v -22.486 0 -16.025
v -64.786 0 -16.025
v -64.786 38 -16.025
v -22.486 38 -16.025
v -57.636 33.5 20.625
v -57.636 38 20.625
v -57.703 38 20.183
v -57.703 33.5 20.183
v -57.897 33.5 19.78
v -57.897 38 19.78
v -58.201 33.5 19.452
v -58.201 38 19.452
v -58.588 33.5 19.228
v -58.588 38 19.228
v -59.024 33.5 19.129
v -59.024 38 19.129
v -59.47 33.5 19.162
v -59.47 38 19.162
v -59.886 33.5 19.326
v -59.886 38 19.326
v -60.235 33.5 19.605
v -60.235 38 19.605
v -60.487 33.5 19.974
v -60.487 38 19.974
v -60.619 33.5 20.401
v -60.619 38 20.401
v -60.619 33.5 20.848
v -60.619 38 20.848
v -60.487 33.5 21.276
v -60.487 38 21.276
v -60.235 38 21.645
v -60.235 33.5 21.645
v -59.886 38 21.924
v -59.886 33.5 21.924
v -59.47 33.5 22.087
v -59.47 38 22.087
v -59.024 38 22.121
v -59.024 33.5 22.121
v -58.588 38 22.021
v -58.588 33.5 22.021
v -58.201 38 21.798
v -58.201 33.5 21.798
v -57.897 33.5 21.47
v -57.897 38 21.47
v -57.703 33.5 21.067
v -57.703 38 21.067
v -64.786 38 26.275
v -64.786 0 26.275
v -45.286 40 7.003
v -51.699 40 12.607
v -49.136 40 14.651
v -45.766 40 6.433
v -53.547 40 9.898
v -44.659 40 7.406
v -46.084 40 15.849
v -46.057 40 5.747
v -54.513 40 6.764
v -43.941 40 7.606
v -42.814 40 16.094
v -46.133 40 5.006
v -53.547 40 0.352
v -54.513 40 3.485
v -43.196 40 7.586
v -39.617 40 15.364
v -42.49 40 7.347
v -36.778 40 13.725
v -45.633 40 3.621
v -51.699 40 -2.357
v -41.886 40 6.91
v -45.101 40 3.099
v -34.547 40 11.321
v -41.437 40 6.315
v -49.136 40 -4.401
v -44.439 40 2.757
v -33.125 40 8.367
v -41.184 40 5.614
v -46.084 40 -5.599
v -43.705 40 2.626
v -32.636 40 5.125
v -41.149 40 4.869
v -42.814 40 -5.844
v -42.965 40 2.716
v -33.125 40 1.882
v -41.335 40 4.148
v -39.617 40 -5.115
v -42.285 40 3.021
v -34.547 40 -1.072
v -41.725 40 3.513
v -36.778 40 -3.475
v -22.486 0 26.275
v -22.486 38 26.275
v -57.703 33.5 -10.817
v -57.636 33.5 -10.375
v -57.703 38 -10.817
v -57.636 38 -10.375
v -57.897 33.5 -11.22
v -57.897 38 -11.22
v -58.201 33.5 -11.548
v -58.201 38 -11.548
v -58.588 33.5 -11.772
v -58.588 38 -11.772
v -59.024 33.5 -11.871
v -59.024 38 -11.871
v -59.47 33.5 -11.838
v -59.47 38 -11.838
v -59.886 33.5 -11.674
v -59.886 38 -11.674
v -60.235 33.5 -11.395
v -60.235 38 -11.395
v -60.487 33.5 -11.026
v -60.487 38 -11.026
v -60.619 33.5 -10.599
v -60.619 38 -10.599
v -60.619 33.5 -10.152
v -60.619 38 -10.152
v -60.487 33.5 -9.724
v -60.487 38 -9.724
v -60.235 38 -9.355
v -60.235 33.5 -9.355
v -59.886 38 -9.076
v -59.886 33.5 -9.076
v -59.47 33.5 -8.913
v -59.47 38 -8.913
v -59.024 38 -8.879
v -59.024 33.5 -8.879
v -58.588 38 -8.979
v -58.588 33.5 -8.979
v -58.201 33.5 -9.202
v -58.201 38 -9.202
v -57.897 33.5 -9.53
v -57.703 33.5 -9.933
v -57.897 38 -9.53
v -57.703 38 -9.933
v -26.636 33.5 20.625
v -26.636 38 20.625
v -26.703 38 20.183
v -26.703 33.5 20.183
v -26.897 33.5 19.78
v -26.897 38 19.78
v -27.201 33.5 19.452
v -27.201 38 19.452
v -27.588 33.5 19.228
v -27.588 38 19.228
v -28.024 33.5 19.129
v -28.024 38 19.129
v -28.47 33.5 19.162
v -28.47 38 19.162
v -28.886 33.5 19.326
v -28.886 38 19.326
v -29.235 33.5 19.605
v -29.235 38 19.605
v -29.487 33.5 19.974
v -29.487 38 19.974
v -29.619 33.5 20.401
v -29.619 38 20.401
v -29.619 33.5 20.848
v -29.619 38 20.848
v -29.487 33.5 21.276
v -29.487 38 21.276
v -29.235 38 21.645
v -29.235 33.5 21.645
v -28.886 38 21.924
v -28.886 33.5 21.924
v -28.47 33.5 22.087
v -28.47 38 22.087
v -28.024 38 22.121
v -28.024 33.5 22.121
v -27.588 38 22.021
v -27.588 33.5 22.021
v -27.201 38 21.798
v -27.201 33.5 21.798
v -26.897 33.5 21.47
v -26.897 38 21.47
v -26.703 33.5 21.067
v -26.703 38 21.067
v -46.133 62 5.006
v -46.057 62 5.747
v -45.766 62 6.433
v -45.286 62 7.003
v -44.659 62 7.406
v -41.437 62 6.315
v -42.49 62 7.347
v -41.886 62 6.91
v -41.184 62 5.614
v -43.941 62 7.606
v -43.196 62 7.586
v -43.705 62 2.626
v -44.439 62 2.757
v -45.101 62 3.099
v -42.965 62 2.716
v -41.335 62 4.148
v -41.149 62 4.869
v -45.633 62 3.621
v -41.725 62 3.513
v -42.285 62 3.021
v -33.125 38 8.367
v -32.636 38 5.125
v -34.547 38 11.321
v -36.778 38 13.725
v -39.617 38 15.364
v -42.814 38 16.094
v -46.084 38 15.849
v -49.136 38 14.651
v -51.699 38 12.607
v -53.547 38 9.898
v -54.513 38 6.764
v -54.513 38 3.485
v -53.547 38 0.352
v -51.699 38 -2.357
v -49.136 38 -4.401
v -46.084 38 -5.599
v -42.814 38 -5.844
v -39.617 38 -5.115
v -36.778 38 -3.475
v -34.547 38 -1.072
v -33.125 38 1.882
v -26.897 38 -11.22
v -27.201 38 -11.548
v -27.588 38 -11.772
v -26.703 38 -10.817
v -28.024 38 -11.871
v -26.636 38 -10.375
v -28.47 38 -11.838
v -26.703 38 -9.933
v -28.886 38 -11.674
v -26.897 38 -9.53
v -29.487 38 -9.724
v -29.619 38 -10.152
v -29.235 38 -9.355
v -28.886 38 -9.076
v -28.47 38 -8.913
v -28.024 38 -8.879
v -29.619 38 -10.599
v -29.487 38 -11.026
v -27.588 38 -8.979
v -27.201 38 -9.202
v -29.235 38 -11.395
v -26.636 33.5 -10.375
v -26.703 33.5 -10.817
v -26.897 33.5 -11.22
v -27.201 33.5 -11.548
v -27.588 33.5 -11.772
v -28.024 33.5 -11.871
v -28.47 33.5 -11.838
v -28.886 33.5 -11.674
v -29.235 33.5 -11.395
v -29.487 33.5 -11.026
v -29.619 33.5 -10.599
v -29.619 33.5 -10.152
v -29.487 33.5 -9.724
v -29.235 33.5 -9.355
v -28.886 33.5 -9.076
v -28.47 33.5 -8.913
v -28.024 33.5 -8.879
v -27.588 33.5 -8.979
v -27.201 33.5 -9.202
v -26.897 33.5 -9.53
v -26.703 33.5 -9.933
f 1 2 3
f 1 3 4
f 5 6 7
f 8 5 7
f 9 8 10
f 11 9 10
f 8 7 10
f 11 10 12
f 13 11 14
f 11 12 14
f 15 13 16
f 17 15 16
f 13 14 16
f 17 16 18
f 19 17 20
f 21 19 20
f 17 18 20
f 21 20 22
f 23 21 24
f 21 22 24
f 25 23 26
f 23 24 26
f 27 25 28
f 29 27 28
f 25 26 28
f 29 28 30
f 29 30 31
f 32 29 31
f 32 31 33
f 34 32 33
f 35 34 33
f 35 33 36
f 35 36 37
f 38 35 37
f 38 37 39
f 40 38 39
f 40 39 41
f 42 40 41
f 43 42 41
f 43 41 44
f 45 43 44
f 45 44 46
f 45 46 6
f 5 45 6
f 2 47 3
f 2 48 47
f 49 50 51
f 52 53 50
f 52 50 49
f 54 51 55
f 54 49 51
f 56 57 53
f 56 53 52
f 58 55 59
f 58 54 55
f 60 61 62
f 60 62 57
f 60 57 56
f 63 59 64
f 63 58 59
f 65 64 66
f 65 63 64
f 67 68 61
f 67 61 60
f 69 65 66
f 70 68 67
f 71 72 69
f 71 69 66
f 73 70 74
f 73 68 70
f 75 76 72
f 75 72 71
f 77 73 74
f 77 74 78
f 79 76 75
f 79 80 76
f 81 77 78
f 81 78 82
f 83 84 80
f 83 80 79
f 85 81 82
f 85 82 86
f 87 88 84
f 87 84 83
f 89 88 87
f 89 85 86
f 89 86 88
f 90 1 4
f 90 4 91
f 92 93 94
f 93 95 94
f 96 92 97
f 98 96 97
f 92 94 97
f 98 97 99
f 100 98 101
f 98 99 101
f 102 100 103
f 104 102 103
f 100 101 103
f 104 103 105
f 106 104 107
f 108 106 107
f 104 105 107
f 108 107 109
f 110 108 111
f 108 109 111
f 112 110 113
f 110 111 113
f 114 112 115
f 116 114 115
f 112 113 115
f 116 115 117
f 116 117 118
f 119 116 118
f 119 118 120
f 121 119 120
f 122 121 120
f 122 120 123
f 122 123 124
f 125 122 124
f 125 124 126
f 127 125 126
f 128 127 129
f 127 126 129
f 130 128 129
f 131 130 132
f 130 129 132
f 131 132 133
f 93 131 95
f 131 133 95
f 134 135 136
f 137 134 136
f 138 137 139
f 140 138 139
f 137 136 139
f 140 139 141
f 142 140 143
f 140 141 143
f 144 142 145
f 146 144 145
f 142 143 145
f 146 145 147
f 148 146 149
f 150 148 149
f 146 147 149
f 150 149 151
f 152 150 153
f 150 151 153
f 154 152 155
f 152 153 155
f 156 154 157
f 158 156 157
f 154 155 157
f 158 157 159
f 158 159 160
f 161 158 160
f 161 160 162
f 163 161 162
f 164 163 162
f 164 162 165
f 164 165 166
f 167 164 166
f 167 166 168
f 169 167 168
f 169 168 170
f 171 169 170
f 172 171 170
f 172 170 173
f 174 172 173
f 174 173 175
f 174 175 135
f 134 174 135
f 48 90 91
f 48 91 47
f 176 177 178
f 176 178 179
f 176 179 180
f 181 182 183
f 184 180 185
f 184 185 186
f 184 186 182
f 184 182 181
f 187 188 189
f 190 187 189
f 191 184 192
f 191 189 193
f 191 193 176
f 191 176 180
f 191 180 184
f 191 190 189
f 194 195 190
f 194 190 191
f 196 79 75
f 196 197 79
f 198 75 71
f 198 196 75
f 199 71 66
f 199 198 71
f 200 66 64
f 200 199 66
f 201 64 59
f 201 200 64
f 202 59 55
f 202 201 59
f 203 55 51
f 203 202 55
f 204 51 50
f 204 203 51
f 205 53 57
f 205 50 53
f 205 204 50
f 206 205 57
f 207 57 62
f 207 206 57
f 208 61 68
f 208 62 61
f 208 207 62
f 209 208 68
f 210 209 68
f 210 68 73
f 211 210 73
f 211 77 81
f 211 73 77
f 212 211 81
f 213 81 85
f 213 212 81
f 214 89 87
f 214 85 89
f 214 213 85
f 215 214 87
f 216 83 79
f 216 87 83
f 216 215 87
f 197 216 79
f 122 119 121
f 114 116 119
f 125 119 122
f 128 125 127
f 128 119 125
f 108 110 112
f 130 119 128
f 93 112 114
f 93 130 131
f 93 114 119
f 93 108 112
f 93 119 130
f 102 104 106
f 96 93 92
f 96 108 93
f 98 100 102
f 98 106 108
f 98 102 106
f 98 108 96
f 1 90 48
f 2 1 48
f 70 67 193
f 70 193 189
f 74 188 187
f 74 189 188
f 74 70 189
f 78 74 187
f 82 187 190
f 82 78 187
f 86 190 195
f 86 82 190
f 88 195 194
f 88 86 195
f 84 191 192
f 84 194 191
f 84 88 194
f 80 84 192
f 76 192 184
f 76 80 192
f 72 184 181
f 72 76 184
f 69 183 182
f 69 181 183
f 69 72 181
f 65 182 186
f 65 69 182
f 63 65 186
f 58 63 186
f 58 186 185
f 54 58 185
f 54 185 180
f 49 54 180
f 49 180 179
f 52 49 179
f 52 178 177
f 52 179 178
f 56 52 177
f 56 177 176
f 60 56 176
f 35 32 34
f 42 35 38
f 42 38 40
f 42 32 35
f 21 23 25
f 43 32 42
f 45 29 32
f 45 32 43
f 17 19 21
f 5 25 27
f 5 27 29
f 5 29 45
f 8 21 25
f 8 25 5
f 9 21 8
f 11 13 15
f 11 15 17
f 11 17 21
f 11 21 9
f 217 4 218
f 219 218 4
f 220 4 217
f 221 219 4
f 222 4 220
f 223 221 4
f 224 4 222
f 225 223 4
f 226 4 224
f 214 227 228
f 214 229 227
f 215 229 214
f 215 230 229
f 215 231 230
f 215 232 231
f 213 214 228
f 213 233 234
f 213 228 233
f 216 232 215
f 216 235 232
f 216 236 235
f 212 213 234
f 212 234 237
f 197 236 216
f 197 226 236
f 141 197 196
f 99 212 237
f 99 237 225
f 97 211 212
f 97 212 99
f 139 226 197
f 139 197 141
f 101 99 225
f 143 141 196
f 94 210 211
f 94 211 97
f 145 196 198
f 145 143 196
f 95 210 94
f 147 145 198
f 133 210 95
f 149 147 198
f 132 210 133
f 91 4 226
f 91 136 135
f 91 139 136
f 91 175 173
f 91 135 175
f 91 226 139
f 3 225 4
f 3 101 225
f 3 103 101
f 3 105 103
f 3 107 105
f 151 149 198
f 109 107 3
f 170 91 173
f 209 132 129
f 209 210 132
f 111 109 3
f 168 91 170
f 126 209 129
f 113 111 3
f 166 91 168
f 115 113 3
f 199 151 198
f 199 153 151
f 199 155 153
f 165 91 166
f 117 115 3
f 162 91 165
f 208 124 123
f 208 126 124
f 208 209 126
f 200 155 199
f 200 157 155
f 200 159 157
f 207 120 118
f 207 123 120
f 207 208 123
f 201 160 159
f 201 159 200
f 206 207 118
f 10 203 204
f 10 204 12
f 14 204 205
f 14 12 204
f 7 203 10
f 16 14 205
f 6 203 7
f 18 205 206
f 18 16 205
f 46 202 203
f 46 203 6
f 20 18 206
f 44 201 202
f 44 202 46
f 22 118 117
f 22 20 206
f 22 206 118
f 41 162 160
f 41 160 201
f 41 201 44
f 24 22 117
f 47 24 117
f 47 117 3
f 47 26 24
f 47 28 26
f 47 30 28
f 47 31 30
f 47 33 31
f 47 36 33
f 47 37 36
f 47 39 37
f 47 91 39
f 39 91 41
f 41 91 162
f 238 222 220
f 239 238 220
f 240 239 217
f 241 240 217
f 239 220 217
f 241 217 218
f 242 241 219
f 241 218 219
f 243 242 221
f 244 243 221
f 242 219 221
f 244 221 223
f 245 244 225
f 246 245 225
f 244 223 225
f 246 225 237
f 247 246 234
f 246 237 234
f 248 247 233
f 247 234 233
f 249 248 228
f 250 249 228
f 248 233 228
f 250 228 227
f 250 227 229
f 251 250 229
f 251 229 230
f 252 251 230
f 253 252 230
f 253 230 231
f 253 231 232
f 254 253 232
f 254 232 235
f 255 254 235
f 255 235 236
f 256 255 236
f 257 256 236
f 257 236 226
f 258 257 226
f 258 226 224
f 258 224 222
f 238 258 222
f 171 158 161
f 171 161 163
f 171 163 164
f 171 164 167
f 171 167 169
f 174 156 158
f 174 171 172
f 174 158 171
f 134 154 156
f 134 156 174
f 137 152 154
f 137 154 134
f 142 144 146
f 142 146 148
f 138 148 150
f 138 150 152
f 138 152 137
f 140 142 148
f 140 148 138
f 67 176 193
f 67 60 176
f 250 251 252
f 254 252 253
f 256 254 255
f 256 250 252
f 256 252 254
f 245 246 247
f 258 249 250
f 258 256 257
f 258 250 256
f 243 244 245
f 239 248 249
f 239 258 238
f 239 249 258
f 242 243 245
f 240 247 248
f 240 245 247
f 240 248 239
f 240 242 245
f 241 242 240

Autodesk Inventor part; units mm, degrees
ref_plane "YZ Plane" through (0, 0, 0) normal (1, 0, 0) x (0, 1, 0)
ref_plane "XZ Plane" through (0, 0, 0) normal (0, 1, 0) x (-1, 0, 0)
ref_plane "XY Plane" through (0, 0, 0) normal (0, 0, 1) x (1, 0, 0)
sketch "Sketch1" plane through (0, 0, 0) normal (0, 1, 0) x (-1, 0, 0)
  line L0 (22.4859, 26.2748) -> (64.7859, 26.2748)
  line L1 (64.7859, 26.2748) -> (64.7859, -16.0252)
  line L2 (64.7859, -16.0252) -> (22.4859, -16.0252)
  line L3 (22.4859, -16.0252) -> (22.4859, 26.2748)
  point P0 (0, 0)
  dimension "d0" = 42.3
  dimension "d1" = 42.3
extrude "Extrusion1" add sketch "Sketch1" along normal blind 38
sketch "Sketch2" plane through (0, 38, 0) normal (0, 1, 0) x (1, 0, 0)
  line L0 (-64.7859, -26.2748) -> (-22.4859, -26.2748) construction
  line L1 (-22.4859, -26.2748) -> (-22.4859, 16.0252) construction
  line L2 (-22.4859, 16.0252) -> (-64.7859, 16.0252) construction
  line L3 (-64.7859, 16.0252) -> (-64.7859, -26.2748) construction
  line L4 (-28.1359, -20.6248) -> (-59.1359, -20.6248) construction
  line L5 (-59.1359, -20.6248) -> (-59.1359, 10.3752) construction
  line L6 (-59.1359, 10.3752) -> (-28.1359, 10.3752) construction
  line L7 (-28.1359, 10.3752) -> (-28.1359, -20.6248) construction
  line L8 (-28.1359, -20.6248) -> (-59.1359, 10.3752) construction
  line L9 (-59.1359, -20.6248) -> (-28.1359, 10.3752) construction
  circle A0 centre (-59.1359, -20.6248) radius 1.5
  circle A1 centre (-59.1359, 10.3752) radius 1.5
  circle A2 centre (-28.1359, -20.6248) radius 1.5
  circle A3 centre (-28.1359, 10.3752) radius 1.5
  point P0 (0, 0)
  point P1 (-43.6359, -5.1248)
  dimension "d4" = 31
  dimension "d5" = 31
  dimension "d6" = 3
  dimension "d7" = 3
  dimension "d8" = 3
  dimension "d9" = 3
extrude "Extrusion2" cut sketch "Sketch2" against normal blind 4.5
sketch "Sketch3" plane through (0, 38, 0) normal (0, 1, 0) x (1, 0, 0)
  circle A0 centre (-28.1359, -20.6248) radius 1.5 construction
  circle A1 centre (-59.1359, -20.6248) radius 1.5 construction
  circle A2 centre (-59.1359, 10.3752) radius 1.5 construction
  circle A3 centre (-28.1359, 10.3752) radius 1.5 construction
  line L0 (-64.7859, -26.2748) -> (-22.4859, -26.2748) construction
  line L1 (-22.4859, -26.2748) -> (-22.4859, 16.0252) construction
  line L2 (-22.4859, 16.0252) -> (-64.7859, 16.0252) construction
  line L3 (-64.7859, 16.0252) -> (-64.7859, -26.2748) construction
  circle A4 centre (-43.6359, -5.1248) radius 11
  point P0 (0, 0)
  dimension "d12" = 22
extrude "Extrusion3" add sketch "Sketch3" along normal blind 2
sketch "Sketch4" plane through (-43.6359, 40, 5.1248) normal (0, 1, 0) x (1, 0, 0)
  circle A0 centre (0, 0) radius 11 construction
  circle A1 centre (15.5, -15.5) radius 1.5 construction
  circle A2 centre (-15.5, -15.5) radius 1.5 construction
  circle A3 centre (-15.5, 15.5) radius 1.5 construction
  circle A4 centre (15.5, 15.5) radius 1.5 construction
  line L0 (-21.15, -21.15) -> (21.15, -21.15) construction
  line L1 (21.15, -21.15) -> (21.15, 21.15) construction
  line L2 (21.15, 21.15) -> (-21.15, 21.15) construction
  line L3 (-21.15, 21.15) -> (-21.15, -21.15) construction
  arc A5 (-2.4972, 0.1192) -> (-1.9972, 1.5038) centre (0, 0) ccw
  line L4 (-2.4972, 0.1192) -> (-1.9972, 1.5038)
  point P0 (43.6359, 5.1248)
  dimension "d15" = 5
  dimension "d16" = 0.5
extrude "Extrusion4" add sketch "Sketch4" along normal blind 22
